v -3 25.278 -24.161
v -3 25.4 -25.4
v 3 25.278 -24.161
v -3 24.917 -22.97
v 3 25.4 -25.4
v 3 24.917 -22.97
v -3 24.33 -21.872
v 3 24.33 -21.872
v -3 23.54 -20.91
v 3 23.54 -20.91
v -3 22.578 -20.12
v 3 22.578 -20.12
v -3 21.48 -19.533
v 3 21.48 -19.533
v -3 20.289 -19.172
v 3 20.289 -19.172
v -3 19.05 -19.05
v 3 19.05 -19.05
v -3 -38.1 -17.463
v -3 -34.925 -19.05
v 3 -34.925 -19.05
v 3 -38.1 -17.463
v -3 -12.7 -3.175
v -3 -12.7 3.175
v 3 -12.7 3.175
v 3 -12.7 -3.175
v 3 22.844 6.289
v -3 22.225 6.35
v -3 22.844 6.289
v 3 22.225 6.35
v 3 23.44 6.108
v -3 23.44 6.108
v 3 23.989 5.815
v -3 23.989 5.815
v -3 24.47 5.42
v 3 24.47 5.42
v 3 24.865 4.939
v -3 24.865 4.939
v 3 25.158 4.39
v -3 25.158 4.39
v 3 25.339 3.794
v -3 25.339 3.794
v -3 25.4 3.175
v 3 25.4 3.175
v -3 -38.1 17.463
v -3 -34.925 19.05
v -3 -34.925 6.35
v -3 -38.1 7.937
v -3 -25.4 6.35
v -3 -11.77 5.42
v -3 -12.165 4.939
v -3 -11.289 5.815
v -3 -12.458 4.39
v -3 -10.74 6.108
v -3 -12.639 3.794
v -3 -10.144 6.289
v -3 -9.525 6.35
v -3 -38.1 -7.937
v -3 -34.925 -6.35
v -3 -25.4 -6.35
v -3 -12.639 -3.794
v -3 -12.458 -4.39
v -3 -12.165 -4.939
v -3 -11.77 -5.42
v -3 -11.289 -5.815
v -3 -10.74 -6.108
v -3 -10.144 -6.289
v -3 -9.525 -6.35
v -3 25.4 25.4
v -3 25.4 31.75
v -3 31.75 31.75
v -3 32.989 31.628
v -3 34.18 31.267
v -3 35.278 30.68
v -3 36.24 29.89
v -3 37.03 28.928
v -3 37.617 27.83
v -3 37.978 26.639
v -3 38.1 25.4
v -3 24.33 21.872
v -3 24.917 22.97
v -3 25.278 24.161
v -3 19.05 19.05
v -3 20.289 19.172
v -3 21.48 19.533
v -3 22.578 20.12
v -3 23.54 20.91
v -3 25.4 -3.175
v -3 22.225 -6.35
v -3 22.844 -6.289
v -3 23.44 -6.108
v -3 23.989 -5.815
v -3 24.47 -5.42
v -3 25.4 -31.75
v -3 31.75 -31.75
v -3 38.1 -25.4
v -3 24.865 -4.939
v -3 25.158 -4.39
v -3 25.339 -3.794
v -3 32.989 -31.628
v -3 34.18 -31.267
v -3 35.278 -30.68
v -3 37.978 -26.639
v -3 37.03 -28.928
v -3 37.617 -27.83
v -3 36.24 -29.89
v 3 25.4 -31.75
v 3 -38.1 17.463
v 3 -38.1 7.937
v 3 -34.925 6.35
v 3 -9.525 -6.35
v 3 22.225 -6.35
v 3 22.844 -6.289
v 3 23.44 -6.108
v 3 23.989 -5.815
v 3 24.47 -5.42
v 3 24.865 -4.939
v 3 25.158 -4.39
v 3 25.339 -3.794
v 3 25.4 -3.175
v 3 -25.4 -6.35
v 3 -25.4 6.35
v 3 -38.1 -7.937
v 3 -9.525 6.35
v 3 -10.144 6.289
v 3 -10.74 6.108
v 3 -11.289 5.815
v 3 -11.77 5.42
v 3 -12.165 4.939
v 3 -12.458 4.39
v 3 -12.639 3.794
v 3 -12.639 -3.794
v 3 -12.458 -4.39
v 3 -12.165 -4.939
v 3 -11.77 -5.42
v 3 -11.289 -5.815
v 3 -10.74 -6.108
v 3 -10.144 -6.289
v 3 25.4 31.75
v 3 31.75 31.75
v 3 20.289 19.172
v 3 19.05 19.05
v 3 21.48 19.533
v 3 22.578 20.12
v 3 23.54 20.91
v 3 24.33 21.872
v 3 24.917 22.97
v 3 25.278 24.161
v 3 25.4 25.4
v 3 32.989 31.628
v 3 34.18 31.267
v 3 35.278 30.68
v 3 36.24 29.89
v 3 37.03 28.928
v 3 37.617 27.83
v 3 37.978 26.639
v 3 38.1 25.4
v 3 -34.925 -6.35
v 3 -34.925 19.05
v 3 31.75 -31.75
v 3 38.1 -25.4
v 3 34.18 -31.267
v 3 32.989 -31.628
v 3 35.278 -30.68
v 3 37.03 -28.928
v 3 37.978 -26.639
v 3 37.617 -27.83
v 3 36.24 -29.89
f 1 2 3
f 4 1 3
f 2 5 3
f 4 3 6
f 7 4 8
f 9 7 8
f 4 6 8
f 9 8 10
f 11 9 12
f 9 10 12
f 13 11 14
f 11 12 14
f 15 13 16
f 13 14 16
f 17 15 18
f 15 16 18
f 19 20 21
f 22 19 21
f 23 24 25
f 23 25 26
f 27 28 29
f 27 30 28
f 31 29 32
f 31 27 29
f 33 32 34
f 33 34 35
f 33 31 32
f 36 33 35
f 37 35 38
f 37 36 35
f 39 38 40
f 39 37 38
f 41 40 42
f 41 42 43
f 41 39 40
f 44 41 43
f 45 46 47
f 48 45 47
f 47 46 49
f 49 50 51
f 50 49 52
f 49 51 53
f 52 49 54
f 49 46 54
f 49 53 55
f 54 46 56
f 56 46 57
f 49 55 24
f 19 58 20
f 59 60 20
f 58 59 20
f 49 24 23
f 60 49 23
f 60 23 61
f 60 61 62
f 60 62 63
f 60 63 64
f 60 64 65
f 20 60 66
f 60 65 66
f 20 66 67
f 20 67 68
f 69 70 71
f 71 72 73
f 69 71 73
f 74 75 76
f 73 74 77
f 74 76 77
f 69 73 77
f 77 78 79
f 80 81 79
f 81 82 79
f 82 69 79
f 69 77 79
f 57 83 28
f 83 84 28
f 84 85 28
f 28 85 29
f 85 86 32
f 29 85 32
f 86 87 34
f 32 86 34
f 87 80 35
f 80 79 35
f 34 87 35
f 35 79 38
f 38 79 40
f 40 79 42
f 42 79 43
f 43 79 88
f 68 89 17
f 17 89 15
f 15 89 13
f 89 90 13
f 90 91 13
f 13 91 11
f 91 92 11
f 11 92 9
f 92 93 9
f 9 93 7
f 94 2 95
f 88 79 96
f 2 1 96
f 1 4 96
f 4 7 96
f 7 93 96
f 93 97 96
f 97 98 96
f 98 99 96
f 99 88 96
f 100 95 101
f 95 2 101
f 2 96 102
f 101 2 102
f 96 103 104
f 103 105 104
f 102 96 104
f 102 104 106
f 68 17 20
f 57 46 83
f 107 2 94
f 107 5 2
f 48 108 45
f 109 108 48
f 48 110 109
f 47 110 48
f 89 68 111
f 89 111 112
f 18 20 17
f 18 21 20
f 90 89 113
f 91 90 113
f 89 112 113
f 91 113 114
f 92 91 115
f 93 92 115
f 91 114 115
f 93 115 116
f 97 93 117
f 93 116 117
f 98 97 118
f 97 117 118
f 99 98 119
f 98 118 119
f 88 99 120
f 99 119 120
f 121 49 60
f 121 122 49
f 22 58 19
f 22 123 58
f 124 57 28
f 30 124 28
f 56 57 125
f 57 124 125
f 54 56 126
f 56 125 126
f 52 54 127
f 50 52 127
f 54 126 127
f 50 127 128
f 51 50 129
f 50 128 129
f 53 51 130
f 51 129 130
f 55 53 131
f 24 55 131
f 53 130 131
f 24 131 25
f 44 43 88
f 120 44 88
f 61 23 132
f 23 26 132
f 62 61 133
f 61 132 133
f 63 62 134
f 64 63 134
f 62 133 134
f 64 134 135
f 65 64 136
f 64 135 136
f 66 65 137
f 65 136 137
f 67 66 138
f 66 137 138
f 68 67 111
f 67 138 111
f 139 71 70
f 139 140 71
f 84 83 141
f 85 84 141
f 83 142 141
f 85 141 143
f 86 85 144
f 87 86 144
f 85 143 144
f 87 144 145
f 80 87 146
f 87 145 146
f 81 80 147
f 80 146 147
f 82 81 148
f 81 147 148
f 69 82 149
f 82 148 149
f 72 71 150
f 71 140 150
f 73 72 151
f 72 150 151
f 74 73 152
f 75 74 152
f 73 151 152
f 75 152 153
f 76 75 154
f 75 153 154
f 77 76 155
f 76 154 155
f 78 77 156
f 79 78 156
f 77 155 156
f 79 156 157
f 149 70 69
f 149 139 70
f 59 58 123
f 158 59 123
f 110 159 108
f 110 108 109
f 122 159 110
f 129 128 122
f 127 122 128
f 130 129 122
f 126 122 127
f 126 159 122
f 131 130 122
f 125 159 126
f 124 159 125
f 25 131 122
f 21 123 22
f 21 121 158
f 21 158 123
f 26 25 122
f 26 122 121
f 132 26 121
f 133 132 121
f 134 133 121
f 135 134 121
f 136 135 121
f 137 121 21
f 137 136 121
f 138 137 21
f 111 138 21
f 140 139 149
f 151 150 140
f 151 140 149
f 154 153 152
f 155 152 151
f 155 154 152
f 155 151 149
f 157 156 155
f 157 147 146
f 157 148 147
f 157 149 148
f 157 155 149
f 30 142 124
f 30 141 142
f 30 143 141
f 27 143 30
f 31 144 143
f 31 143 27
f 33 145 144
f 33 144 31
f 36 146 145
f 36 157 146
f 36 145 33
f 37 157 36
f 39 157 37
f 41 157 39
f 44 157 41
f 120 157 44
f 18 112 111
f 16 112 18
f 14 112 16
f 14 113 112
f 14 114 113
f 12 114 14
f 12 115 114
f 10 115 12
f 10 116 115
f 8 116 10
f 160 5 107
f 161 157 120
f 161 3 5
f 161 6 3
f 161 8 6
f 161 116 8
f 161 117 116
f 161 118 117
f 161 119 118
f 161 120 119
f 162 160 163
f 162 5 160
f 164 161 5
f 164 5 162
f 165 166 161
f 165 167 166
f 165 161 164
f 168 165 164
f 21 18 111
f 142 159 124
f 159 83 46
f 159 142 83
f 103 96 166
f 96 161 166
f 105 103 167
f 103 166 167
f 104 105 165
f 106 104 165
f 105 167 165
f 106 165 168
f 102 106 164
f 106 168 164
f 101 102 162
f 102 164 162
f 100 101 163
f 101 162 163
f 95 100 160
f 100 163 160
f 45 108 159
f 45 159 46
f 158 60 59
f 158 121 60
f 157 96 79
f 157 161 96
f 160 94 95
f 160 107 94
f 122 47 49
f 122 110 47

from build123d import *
from OCP.BRepFilletAPI import BRepFilletAPI_MakeChamfer

# Parameters (mm, degrees)
BOSS_EXTRUDE1_DEPTH     = 2.999999969
FILLET1_R               = 6.35
CUT_EXTRUDE1_DEPTH      = 50.956706249
CUT_EXTRUDE1_DEPTH_BACK = 50.956706249
SKETCH2_W               = 12.7
SKETCH2_H               = 38.1
FILLET2_R               = 3.175
CHAMFER1_SIZE           = 3.175
CHAMFER1_SIZE2          = 1.5875
CHAMFER2_SIZE           = 1.5875
CHAMFER2_SIZE2          = 3.175


with BuildPart() as part:
    # Sketch1 → Boss-Extrude1 (new, symmetric)
    with BuildSketch(Plane(origin=(0, 0, 0), x_dir=(0, 0, -1), z_dir=(1, 0, 0))):
        Polygon((-6.35, -25.4), (6.35, -25.4), (6.35, -38.1), (19.05, -38.1), (19.05, -25.4), (19.05, 25.4), (31.75, 25.4), (31.75, 38.1), (-31.75, 38.1), (-31.75, 25.4), (-19.05, 25.4), (-19.05, -25.4), (-19.05, -38.1), (-6.35, -38.1), align=None)
    extrude(amount=BOSS_EXTRUDE1_DEPTH, both=True)

    # Fillet1
    fillet1_edges = [part.edges().sort_by_distance(p)[0] for p in [
        (0, 25.4, -19.05),
        (0, 25.4, 19.05),
        (0, 38.1, 31.75),
        (0, 38.1, -31.75),
    ]]
    fillet(fillet1_edges, radius=FILLET1_R)

    # Sketch2 → Cut-Extrude1 (cut, two sides: drawn at the far end of the back side and taken through both)
    with BuildSketch(Plane(origin=(2.999999969, 0, 0), x_dir=(0, 0, -1), z_dir=(1, 0, 0)).offset(-CUT_EXTRUDE1_DEPTH_BACK)):
        with Locations((0, 6.35)):
            Rectangle(SKETCH2_W, SKETCH2_H)
    extrude(amount=CUT_EXTRUDE1_DEPTH + CUT_EXTRUDE1_DEPTH_BACK, mode=Mode.SUBTRACT)

    # Fillet2
    fillet2_edges = [part.edges().sort_by_distance(p)[0] for p in [
        (0, 25.4, -6.35),
        (0, -12.7, -6.35),
        (0, -12.7, 6.35),
        (0, 25.4, 6.35),
    ]]
    fillet(fillet2_edges, radius=FILLET2_R)

    # Chamfer1: one chamfer whose edges measure the first distance from different faces: ONE call of the kernel's chamfer builder (chamfer() names one face for all edges)
    chamfer1_edges_1 = [part.edges().sort_by_distance(p)[0] for p in [
        (0, -38.1, -6.35),
    ]]
    chamfer1_side_1 = [part.faces().sort_by_distance(p)[0] for p in [
        (0, -31.75, -6.35),
    ]]
    chamfer1_edges_2 = [part.edges().sort_by_distance(p)[0] for p in [
        (0, -38.1, 19.05),
    ]]
    chamfer1_side_2 = [part.faces().sort_by_distance(p)[0] for p in [
        (0, -9.525, 19.05),
    ]]
    chamfer1 = BRepFilletAPI_MakeChamfer(part.part.solid().wrapped)
    for e in chamfer1_edges_1:
        chamfer1.Add(CHAMFER1_SIZE, CHAMFER1_SIZE2, e.wrapped, chamfer1_side_1[0].wrapped)  # the first distance lies on this face
    for e in chamfer1_edges_2:
        chamfer1.Add(CHAMFER1_SIZE, CHAMFER1_SIZE2, e.wrapped, chamfer1_side_2[0].wrapped)  # the first distance lies on this face
    add(Compound.cast(chamfer1.Shape()), mode=Mode.REPLACE)

    # Chamfer2: one chamfer whose edges measure the first distance from different faces: ONE call of the kernel's chamfer builder (chamfer() names one face for all edges)
    chamfer2_edges_1 = [part.edges().sort_by_distance(p)[0] for p in [
        (0, -38.1, -19.05),
    ]]
    chamfer2_side_1 = [part.faces().sort_by_distance(p)[0] for p in [
        (0, -38.1, -13.49375),
    ]]
    chamfer2_edges_2 = [part.edges().sort_by_distance(p)[0] for p in [
        (0, -38.1, 6.35),
    ]]
    chamfer2_side_2 = [part.faces().sort_by_distance(p)[0] for p in [
        (0, -38.1, 11.90625),
    ]]
    chamfer2 = BRepFilletAPI_MakeChamfer(part.part.solid().wrapped)
    for e in chamfer2_edges_1:
        chamfer2.Add(CHAMFER2_SIZE, CHAMFER2_SIZE2, e.wrapped, chamfer2_side_1[0].wrapped)  # the first distance lies on this face
    for e in chamfer2_edges_2:
        chamfer2.Add(CHAMFER2_SIZE, CHAMFER2_SIZE2, e.wrapped, chamfer2_side_2[0].wrapped)  # the first distance lies on this face
    add(Compound.cast(chamfer2.Shape()), mode=Mode.REPLACE)


solid = part.part
